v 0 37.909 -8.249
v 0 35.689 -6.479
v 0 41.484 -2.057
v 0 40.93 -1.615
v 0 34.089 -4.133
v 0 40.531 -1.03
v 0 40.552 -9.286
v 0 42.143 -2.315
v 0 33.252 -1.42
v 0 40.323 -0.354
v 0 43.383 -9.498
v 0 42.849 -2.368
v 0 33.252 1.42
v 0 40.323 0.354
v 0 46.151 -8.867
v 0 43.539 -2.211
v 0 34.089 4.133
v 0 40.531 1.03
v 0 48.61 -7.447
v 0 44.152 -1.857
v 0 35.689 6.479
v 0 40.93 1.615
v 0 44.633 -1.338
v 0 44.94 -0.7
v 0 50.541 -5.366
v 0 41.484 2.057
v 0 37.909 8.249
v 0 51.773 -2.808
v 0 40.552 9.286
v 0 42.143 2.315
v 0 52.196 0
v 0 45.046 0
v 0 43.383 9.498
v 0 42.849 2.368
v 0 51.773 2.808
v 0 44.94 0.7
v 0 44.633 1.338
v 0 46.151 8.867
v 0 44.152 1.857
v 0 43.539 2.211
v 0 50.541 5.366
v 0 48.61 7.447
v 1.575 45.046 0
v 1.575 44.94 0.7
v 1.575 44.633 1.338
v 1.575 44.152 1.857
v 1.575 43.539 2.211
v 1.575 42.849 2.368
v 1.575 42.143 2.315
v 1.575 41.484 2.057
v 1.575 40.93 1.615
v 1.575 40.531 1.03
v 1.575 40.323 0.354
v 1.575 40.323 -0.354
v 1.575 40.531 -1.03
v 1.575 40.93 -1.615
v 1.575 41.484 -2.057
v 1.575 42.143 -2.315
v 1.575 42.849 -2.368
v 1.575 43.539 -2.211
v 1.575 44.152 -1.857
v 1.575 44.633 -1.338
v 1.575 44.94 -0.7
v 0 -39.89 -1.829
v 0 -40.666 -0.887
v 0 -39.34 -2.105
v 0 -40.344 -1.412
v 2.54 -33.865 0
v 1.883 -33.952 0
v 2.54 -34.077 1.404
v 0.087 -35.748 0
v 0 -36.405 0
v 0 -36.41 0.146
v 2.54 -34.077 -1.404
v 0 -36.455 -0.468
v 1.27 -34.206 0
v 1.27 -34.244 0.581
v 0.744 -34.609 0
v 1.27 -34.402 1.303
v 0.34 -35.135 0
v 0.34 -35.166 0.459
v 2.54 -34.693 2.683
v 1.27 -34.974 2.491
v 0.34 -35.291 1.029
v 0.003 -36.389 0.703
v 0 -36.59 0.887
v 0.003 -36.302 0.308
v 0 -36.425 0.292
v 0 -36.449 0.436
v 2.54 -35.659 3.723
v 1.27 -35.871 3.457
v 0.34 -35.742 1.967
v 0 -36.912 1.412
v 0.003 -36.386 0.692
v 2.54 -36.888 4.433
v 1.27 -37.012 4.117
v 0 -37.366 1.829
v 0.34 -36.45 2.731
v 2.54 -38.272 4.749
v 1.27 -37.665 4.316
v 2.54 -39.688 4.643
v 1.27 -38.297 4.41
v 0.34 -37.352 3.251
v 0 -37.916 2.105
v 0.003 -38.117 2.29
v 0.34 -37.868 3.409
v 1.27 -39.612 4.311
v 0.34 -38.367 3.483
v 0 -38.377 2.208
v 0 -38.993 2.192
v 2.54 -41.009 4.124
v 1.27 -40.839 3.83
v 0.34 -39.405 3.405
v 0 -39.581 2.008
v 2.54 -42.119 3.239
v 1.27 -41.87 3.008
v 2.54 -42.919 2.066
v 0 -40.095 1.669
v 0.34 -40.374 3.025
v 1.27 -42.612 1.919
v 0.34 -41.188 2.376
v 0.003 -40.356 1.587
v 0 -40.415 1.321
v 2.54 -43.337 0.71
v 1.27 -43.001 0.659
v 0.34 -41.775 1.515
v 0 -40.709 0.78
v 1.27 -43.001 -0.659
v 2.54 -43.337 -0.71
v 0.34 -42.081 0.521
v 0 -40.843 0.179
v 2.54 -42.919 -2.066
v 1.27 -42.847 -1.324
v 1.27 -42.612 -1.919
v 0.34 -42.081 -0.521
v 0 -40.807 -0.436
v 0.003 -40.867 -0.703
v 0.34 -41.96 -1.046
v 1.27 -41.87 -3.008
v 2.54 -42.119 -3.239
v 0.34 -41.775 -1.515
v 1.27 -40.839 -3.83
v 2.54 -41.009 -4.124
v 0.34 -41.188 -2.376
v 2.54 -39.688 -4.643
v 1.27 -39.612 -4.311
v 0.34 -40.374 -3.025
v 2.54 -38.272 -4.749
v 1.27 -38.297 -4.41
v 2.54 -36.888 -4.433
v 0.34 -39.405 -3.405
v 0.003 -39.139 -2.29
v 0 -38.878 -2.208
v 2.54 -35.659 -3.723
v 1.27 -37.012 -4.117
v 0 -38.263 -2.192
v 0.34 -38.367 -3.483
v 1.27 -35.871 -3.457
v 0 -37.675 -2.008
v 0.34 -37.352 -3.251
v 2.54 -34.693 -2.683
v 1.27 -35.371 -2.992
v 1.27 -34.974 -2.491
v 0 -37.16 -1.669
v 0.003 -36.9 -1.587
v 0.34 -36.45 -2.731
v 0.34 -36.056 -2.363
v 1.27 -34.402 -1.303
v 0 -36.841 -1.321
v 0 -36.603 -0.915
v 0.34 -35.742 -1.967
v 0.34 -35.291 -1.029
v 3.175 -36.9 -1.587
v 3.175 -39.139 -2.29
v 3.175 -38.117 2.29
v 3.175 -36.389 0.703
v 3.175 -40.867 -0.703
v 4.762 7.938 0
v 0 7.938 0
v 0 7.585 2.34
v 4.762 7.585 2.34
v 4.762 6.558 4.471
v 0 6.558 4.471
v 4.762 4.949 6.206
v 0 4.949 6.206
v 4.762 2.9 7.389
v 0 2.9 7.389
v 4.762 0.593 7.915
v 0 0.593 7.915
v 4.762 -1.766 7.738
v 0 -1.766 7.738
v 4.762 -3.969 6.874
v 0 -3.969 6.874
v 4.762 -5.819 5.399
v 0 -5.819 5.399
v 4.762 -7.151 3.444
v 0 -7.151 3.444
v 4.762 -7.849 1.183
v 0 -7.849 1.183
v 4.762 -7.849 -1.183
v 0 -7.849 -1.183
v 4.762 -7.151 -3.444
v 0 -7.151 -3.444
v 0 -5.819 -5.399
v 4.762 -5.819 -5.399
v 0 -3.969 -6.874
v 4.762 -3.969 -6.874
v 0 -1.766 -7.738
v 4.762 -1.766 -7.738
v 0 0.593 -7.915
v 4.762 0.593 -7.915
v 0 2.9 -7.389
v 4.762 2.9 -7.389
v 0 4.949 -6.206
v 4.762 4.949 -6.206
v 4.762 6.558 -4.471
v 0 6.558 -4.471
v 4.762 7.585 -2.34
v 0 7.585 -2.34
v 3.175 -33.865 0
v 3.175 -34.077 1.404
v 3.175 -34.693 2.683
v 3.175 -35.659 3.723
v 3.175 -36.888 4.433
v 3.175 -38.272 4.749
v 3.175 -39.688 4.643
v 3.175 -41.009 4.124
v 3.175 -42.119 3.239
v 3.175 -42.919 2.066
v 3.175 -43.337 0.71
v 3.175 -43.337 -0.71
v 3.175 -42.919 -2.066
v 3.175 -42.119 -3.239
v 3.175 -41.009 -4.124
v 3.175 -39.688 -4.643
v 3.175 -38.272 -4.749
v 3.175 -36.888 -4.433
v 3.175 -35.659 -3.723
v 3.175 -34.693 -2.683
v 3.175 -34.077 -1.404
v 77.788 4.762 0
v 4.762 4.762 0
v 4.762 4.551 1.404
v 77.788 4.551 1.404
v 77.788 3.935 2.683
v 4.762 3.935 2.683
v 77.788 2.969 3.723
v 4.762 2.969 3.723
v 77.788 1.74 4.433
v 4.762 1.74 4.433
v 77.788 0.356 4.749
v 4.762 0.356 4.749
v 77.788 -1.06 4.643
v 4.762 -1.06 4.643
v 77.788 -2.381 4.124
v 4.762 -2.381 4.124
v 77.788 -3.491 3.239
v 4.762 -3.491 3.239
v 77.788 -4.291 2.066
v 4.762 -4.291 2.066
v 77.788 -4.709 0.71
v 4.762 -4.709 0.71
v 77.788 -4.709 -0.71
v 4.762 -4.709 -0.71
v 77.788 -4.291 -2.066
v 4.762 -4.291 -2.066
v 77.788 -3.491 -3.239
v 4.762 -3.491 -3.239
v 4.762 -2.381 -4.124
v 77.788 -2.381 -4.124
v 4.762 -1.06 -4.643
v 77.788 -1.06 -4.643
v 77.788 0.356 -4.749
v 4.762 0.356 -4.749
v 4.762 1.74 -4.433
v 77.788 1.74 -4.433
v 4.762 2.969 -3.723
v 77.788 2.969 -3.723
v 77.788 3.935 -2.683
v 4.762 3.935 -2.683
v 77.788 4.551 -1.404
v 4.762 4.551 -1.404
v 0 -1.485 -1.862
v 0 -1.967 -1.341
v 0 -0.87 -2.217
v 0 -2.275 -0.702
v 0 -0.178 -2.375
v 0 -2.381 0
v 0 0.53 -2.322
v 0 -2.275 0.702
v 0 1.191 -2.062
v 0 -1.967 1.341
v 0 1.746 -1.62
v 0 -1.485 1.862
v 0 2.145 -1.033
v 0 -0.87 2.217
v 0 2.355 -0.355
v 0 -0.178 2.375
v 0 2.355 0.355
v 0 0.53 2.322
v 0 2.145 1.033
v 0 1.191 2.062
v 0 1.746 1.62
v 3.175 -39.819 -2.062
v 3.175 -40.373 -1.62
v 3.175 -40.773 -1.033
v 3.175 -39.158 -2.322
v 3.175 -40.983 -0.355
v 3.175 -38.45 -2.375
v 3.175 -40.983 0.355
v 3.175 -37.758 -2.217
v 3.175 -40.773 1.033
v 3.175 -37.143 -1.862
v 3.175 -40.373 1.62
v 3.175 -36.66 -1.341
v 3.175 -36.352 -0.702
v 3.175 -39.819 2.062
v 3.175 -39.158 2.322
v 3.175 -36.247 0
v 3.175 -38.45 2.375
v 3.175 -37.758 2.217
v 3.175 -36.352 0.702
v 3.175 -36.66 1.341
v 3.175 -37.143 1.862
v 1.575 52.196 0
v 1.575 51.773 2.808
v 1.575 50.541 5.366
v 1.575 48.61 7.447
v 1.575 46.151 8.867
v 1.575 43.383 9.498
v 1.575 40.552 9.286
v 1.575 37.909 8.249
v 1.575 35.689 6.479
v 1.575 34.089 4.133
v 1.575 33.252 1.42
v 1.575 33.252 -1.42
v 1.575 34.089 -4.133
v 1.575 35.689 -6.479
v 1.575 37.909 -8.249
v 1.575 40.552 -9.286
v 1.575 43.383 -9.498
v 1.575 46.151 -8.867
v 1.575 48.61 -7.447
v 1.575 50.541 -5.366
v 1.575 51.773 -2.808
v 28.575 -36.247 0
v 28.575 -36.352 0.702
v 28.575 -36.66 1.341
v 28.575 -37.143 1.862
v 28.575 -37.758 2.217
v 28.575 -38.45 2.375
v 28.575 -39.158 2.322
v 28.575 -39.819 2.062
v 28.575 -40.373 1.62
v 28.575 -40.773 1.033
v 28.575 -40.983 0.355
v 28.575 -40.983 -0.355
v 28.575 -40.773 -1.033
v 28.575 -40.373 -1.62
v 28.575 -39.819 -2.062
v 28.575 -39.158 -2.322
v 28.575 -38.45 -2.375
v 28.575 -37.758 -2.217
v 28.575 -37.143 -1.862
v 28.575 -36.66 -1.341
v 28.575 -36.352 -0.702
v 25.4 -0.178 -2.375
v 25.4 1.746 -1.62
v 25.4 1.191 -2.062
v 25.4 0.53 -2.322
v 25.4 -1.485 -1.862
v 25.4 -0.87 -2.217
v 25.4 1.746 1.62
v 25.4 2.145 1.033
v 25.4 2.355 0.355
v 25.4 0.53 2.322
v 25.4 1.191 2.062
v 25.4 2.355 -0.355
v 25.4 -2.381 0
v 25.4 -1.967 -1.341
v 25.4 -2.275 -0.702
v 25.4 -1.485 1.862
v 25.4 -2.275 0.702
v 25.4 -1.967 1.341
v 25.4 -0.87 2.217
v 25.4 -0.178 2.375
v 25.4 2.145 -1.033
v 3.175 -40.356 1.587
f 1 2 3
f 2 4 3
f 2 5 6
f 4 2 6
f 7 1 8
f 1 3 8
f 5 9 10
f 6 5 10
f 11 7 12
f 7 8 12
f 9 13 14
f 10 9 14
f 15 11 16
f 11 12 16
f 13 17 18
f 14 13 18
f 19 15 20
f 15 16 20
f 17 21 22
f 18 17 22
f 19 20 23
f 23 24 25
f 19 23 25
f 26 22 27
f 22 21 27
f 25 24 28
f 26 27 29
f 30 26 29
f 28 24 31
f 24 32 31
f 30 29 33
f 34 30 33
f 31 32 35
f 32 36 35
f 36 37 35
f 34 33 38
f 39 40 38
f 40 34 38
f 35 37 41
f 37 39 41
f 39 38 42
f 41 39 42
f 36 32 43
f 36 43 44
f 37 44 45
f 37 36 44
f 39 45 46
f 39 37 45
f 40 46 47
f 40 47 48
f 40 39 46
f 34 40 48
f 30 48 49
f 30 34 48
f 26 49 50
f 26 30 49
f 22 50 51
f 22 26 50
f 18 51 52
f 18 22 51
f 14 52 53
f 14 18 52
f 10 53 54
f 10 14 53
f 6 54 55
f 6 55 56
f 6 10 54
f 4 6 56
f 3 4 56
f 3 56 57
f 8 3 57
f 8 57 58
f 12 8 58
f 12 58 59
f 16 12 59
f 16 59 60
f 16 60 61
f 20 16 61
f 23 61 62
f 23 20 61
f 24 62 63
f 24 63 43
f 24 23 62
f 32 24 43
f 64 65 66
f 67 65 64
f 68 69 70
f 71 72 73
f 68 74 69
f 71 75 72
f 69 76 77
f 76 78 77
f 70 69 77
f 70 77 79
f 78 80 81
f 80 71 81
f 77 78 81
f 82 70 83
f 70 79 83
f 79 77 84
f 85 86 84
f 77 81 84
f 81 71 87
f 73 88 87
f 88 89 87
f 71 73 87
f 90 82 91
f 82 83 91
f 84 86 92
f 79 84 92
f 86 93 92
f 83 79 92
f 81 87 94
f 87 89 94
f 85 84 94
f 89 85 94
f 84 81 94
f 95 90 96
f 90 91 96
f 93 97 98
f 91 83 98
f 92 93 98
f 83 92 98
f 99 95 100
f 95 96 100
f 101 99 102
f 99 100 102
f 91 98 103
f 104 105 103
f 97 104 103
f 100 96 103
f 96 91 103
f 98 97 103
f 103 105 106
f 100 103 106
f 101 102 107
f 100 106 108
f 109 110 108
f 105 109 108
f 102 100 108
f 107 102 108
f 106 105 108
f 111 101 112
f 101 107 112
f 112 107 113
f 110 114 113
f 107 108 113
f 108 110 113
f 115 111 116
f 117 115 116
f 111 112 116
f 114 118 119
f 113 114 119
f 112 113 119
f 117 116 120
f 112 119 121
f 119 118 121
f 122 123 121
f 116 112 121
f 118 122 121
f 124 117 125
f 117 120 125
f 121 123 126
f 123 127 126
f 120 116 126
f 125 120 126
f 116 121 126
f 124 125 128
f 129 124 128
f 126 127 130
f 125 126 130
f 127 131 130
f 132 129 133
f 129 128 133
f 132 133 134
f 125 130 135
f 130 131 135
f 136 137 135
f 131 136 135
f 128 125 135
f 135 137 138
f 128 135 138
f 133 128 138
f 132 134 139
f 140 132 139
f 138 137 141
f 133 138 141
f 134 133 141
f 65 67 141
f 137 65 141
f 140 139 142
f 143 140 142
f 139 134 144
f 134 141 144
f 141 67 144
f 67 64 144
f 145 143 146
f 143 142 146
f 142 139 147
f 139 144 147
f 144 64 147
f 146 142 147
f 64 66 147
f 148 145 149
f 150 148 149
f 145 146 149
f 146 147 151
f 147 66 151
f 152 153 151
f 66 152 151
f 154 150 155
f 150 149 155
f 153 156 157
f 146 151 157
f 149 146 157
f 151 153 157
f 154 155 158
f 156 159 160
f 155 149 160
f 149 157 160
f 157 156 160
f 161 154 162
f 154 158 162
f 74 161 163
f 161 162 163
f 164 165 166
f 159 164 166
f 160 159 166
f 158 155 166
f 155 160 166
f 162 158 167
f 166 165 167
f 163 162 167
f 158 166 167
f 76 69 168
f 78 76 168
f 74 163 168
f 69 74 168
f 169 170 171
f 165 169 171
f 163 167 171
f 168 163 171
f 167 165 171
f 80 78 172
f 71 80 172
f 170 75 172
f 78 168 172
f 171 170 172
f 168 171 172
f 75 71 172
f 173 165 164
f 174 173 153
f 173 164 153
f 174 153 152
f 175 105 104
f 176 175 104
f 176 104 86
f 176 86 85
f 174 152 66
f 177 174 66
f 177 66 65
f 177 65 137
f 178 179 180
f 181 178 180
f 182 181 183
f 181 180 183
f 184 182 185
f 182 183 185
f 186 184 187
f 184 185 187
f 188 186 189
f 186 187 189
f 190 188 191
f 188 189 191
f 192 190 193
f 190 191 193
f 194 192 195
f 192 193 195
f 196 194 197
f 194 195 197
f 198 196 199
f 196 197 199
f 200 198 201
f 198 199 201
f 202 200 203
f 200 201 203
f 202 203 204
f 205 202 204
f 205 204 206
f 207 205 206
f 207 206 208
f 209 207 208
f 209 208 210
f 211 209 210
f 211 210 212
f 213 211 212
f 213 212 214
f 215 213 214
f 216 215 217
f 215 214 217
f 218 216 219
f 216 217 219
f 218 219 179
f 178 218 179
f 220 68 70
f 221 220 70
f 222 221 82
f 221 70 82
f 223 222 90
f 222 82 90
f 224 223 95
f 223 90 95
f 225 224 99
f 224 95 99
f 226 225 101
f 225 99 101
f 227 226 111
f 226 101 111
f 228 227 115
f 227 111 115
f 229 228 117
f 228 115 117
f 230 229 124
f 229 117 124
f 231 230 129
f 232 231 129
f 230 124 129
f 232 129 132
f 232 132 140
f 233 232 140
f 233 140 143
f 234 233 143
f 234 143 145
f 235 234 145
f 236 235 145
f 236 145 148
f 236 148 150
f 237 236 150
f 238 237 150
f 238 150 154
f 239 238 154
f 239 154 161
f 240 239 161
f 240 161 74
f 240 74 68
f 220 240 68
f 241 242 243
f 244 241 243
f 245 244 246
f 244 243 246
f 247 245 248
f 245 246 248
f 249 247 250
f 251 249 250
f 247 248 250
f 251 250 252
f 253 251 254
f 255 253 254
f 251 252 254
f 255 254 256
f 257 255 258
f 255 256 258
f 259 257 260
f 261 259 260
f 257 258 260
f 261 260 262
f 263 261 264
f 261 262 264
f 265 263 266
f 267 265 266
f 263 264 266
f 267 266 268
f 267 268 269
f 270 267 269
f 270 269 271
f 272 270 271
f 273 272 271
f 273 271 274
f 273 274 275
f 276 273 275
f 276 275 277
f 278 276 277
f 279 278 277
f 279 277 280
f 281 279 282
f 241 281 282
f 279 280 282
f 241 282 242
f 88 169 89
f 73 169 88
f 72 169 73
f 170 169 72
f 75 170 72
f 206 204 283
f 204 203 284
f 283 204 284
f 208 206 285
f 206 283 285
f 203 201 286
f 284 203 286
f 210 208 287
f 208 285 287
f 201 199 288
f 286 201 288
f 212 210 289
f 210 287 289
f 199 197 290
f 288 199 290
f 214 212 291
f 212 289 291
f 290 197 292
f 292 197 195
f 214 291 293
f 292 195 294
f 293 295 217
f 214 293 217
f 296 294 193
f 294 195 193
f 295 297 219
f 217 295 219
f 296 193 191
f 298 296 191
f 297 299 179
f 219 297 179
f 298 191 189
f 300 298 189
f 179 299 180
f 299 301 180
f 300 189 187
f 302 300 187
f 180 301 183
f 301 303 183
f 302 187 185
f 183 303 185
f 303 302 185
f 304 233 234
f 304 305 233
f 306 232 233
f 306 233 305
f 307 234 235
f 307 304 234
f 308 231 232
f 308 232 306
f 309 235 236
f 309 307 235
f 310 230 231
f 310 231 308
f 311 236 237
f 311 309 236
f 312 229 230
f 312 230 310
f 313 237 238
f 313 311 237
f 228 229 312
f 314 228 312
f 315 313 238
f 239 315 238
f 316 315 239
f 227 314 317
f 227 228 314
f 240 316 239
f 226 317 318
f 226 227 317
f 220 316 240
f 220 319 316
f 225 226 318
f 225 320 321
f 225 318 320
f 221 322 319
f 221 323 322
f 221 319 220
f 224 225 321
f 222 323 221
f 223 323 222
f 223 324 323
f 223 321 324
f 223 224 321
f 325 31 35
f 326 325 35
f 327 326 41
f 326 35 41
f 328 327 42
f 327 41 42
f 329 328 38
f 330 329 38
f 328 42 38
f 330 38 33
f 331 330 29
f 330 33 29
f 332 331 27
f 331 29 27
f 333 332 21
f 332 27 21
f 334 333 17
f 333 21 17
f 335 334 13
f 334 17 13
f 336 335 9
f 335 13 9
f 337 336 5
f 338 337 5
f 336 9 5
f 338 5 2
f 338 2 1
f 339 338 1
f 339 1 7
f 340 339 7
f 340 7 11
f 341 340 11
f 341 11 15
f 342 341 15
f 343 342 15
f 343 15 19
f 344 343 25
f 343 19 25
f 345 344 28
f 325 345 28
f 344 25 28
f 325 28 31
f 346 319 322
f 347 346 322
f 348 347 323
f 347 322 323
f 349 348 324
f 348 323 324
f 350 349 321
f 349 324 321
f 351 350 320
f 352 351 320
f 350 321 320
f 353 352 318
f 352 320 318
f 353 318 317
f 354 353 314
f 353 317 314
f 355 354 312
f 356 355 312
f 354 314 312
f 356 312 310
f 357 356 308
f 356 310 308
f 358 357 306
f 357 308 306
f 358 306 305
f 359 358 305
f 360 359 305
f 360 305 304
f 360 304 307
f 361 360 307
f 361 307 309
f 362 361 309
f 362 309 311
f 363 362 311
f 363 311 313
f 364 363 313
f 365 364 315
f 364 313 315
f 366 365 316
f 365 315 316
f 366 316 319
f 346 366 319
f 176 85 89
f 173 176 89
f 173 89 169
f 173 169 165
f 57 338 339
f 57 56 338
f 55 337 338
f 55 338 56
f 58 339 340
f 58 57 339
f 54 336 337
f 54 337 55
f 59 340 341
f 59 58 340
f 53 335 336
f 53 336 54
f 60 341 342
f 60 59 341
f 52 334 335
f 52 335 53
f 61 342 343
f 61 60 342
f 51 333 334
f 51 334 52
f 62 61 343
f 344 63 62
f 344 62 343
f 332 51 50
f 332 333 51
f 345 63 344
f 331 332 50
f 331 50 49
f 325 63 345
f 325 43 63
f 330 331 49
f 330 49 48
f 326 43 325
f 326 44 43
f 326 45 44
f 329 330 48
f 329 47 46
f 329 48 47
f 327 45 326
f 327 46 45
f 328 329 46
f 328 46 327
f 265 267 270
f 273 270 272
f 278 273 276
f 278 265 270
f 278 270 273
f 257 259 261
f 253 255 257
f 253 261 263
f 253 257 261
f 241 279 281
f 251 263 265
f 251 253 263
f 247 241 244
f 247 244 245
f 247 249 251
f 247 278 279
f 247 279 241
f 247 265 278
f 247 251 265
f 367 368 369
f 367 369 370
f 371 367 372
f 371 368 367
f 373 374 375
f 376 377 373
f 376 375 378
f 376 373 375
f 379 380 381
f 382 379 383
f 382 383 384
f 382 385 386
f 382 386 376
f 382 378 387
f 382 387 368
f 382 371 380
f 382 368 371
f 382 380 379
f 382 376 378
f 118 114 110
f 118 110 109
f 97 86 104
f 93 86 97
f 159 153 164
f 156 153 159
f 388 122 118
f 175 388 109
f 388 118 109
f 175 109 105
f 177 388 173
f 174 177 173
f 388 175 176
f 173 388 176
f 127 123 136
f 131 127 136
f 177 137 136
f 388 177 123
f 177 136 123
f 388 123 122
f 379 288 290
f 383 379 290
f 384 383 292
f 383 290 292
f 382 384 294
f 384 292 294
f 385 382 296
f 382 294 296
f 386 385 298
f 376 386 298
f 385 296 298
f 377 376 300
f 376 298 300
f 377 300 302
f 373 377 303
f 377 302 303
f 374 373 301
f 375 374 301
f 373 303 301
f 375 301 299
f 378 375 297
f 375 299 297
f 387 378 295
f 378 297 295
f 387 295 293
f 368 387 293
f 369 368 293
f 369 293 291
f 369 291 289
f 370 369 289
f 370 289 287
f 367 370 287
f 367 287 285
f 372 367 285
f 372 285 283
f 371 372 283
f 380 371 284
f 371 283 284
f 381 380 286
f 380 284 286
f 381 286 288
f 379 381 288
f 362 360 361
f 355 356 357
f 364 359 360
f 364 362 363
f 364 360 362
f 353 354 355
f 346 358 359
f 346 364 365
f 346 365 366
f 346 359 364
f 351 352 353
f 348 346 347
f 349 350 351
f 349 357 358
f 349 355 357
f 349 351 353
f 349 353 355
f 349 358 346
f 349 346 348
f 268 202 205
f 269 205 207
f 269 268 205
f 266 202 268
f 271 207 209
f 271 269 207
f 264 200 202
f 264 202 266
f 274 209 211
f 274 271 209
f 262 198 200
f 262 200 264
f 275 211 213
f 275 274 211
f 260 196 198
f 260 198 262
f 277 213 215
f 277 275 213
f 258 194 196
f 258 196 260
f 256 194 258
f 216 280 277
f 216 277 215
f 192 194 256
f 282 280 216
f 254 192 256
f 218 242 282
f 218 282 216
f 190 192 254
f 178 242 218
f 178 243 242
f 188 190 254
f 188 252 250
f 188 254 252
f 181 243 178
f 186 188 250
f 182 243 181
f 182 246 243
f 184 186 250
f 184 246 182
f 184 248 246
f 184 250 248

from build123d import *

# Parameters (mm, degrees)
F0_R      = 7.9375
F1_DEPTH  = 4.7625
F2_R      = 4.7625
F3_DEPTH  = 73.025
F4_R      = 2.38125
F5_DEPTH  = 25.4
F6_R      = 9.525
F6_R_2    = 2.3749
F7_DEPTH  = 1.5748
F8_R      = 4.7625
F9_DEPTH  = 3.175
F10_R     = 2.38125
F11_DEPTH = 25.4


# Not quite as in the source:
# - a fillet or chamfer that OpenCascade refuses, or shapes differently, is made with other operations: its cross-section is extruded or revolved along the edge and cut away or added


with BuildPart() as f1:
    # F0 (on Right) → F1 (new body)
    with BuildSketch(Plane.YZ):
        Circle(F0_R)
    extrude(amount=F1_DEPTH)

    # F2 (on face) → F3 (join)
    with BuildSketch(Plane.YZ.offset(4.7625)):
        Circle(F2_R)
    extrude(amount=F3_DEPTH)

    # F4 (on face) → F5 (cut)
    with BuildSketch(Plane(origin=(0, 0, 0), x_dir=(0, -1, 0), z_dir=(-1, 0, 0))):
        Circle(F4_R)
    extrude(amount=-F5_DEPTH, mode=Mode.SUBTRACT)


with BuildPart() as f7:
    # F6 (on Right) → F7 (new body)
    with BuildSketch(Plane.YZ):
        with Locations((42.671024815, 0)):
            Circle(F6_R)
        with Locations((42.671024815, 0)):
            Circle(F6_R_2, mode=Mode.SUBTRACT)
    extrude(amount=F7_DEPTH)


with BuildPart() as f9:
    # F8 (on Right) → F9 (new body)
    with BuildSketch(Plane.YZ):
        with Locations((-38.6279119517, 0)):
            Circle(F8_R)
        Polygon((-36.9000906235, -1.5874504059), (-39.1387736664, -2.2900623664), (-40.8665949945, -0.7026119604), (-40.3557332798, 1.5874504059), (-38.117050237, 2.2900623664), (-36.3892289088, 0.7026119604), align=None, mode=Mode.SUBTRACT)
    extrude(amount=F9_DEPTH)

    # F10 (on face) → F11 (join)
    with BuildSketch(Plane.YZ.offset(3.175)):
        with Locations((-38.6279119517, 0)):
            Circle(F10_R)
        Polygon((-40.3557332798, 1.5874504059), (-38.117050237, 2.2900623664), (-36.3892289088, 0.7026119604), (-36.9000906235, -1.5874504059), (-39.1387736664, -2.2900623664), (-40.8665949945, -0.7026119604), align=None, mode=Mode.SUBTRACT)
        Polygon((-36.3892289088, 0.7026119604), (-38.117050237, 2.2900623664), (-40.3557332798, 1.5874504059), (-40.8665949945, -0.7026119604), (-39.1387736664, -2.2900623664), (-36.9000906235, -1.5874504059), align=None)
    extrude(amount=F11_DEPTH)

    # F12: fillet of radius 2.54 on 1 edges, made by hand

    # F12_s1 → F12_t2 (revolve, cut)
    with BuildSketch(Plane.XY):
        with BuildLine():
            ThreePointArc((2.54, -33.8654119517), (0.7439487758, -34.6093607275), (0, -36.4054119517))
            Line((0, -36.4054119517), (0, -33.8654119517))
            Line((0, -33.8654119517), (2.54, -33.8654119517))
        make_face()
    revolve(axis=Axis((0, -38.6279119517, 0), (1, 0, 0)), mode=Mode.SUBTRACT)


solid = Compound([f1.part, f7.part, f9.part])
